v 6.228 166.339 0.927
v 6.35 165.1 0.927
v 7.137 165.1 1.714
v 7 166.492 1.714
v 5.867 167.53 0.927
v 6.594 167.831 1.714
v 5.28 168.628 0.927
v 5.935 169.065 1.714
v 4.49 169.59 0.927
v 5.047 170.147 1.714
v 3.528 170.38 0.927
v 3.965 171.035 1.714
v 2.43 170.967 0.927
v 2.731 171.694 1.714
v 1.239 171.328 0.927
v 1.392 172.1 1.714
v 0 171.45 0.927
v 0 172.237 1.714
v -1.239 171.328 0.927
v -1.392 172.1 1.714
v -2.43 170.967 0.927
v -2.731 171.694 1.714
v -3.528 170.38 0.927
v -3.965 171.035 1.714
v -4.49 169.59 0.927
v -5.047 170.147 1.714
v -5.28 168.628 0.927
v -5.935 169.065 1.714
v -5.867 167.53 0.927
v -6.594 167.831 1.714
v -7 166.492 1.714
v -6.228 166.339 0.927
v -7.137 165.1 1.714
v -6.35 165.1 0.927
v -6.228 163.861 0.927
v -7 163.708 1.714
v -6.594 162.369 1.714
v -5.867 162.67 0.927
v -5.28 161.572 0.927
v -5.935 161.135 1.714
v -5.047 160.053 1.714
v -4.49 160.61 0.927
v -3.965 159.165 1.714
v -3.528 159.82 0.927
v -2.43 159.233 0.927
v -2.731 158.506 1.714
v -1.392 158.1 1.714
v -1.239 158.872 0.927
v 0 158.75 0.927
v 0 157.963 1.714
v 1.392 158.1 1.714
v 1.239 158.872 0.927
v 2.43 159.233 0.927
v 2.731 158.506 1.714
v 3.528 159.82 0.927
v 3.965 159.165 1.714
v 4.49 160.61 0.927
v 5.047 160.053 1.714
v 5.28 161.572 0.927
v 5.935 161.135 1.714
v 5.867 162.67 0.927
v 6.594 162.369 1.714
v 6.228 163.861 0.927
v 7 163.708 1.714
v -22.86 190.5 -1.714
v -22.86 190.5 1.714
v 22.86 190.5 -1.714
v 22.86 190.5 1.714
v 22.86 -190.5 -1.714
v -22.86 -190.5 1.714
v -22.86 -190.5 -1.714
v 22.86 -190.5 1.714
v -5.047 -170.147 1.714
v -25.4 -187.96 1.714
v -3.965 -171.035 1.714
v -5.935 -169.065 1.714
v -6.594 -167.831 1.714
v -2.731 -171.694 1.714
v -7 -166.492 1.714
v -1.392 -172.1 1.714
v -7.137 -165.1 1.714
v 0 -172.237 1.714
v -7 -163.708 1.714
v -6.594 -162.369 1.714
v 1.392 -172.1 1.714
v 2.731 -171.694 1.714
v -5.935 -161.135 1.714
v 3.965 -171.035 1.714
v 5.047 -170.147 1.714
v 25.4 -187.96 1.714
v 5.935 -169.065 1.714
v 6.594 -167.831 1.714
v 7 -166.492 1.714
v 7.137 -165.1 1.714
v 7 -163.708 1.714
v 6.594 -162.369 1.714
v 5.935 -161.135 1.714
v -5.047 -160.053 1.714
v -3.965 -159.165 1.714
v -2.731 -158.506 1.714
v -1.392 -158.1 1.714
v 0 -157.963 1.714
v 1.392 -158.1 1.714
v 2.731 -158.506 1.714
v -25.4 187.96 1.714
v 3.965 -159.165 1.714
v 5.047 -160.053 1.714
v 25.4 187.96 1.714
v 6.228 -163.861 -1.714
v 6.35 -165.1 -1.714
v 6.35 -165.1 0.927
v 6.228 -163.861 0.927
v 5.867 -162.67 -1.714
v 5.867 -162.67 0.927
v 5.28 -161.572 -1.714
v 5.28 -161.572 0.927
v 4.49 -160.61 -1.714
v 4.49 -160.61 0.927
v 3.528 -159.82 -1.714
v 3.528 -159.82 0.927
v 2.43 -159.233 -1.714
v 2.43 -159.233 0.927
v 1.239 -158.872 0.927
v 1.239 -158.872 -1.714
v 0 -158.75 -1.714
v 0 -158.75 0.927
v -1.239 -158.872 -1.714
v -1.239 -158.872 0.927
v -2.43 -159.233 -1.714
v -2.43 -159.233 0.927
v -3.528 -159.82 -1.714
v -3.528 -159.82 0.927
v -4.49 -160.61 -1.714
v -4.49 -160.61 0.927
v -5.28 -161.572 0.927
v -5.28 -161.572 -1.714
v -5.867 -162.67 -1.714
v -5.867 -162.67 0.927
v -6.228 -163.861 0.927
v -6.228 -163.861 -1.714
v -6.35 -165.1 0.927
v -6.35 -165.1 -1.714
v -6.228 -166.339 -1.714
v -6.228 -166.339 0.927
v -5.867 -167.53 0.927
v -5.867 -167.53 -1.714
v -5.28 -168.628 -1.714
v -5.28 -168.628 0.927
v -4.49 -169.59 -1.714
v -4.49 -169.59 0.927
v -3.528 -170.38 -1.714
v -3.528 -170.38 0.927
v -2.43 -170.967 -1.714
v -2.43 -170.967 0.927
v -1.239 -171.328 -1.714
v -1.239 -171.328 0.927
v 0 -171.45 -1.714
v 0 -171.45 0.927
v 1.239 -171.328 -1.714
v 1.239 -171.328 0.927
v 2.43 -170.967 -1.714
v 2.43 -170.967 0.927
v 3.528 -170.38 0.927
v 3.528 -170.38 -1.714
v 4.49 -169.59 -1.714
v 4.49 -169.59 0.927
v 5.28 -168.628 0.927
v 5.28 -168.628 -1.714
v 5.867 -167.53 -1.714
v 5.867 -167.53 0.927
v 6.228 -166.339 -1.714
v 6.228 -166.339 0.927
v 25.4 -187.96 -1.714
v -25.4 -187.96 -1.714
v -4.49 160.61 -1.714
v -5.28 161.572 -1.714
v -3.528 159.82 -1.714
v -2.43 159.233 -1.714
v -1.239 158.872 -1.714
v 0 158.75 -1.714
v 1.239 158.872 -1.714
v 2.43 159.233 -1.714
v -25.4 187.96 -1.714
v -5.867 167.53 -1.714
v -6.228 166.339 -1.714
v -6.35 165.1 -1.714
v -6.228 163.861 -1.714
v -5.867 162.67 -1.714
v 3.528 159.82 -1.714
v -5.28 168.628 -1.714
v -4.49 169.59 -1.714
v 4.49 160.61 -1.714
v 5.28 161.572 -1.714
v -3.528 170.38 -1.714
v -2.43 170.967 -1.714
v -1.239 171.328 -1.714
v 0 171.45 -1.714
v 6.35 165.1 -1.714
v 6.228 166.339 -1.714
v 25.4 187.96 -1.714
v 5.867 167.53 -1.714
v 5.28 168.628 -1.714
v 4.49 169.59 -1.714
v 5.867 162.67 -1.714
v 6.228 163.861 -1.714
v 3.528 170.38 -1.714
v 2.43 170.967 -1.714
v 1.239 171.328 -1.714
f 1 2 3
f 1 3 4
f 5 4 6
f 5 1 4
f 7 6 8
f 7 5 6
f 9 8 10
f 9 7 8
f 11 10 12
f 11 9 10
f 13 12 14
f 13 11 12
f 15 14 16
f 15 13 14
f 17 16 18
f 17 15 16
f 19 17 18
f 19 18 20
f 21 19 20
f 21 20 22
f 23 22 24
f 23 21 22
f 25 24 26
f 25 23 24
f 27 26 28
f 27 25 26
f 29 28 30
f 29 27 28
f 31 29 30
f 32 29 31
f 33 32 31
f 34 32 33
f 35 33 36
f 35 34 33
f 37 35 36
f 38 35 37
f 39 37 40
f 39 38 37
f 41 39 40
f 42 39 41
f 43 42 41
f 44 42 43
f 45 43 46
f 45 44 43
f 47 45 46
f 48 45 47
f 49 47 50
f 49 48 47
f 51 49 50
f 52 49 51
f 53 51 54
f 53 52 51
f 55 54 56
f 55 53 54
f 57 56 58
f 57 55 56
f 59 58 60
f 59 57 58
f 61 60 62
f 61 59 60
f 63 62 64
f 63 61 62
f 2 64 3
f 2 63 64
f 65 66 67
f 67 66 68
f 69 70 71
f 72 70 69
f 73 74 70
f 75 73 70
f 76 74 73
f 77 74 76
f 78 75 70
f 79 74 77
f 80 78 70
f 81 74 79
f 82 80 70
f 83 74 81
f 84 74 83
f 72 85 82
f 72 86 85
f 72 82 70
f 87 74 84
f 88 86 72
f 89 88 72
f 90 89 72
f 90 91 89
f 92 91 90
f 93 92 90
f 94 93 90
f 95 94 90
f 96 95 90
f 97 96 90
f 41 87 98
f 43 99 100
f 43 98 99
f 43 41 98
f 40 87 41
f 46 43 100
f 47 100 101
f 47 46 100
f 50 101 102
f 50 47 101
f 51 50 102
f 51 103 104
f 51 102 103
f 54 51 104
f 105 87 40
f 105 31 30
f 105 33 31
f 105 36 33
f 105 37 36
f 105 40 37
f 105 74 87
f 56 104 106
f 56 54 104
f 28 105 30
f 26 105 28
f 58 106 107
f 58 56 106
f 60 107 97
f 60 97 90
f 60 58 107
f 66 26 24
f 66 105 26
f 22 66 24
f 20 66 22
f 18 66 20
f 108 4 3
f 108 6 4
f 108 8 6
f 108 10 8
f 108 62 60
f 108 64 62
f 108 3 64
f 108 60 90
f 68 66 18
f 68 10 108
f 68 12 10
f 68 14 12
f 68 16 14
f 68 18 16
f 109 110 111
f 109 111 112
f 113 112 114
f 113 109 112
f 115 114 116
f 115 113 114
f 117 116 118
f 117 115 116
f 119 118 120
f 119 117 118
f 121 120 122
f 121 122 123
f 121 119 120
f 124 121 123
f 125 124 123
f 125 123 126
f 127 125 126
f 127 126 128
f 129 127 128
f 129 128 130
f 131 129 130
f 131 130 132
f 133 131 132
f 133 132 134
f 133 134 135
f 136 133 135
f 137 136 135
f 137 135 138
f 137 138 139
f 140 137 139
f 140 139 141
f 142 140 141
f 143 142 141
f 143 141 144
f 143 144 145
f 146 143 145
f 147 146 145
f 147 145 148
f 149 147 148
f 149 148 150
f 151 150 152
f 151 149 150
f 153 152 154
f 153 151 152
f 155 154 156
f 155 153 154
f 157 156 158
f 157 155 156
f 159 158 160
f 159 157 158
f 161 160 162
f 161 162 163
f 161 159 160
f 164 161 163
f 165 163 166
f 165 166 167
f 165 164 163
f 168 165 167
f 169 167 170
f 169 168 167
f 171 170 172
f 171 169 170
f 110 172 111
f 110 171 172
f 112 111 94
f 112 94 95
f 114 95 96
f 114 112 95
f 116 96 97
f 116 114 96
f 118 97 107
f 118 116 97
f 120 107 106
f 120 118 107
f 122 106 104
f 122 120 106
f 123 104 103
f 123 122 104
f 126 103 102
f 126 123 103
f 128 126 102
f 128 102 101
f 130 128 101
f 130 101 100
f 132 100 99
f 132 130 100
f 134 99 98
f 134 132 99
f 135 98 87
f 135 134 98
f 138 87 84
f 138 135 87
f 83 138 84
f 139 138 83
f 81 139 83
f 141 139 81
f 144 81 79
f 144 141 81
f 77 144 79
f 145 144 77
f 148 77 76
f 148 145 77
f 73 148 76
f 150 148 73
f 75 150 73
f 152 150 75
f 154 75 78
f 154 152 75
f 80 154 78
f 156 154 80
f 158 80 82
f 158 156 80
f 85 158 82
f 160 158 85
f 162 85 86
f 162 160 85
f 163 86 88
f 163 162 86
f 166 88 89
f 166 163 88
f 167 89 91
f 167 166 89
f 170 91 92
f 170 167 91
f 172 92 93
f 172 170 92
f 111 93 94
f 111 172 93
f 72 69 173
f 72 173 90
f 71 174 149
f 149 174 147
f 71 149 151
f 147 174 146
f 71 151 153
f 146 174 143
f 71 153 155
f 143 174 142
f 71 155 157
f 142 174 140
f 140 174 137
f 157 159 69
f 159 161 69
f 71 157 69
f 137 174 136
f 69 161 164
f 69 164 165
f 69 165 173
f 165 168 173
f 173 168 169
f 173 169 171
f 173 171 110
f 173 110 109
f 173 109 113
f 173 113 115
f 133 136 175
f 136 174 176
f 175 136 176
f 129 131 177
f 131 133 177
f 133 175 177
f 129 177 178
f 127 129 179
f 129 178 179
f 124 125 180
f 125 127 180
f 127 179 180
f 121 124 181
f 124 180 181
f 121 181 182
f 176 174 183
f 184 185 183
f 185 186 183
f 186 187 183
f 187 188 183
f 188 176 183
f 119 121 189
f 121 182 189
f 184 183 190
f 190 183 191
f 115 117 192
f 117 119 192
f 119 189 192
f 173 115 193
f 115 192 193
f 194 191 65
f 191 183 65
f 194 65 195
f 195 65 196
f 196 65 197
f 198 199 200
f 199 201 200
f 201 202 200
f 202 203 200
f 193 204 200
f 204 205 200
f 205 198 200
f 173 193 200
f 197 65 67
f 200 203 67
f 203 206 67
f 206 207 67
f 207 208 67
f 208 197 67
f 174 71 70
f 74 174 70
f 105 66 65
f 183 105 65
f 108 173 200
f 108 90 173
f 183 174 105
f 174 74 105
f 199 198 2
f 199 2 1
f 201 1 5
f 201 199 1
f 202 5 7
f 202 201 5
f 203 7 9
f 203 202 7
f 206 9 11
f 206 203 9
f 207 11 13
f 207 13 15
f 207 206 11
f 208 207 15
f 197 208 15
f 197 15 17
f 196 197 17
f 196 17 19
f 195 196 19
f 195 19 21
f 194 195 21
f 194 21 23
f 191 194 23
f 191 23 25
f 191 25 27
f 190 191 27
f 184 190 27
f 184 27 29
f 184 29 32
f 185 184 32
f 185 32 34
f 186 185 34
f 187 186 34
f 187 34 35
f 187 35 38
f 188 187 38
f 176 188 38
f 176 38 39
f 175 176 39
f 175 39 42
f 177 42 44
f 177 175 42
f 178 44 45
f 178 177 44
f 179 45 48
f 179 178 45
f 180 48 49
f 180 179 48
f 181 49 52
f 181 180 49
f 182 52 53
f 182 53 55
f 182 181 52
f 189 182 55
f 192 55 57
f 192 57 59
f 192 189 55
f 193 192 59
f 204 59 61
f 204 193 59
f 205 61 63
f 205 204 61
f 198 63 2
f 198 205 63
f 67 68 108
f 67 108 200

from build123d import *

# Parameters (mm, degrees)
F0_W     = 50.8
F0_H     = 381
F0_R     = 6.35
F1_DEPTH = 1.7145
F2_SIZE  = 2.54
F3_SIZE  = 0.7874


with BuildPart() as f1:
    # F0 (on Top) → F1 (new body, symmetric)
    with BuildSketch(Plane.XY):
        Rectangle(F0_W, F0_H)
        with Locations((0, -165.1)):
            Circle(F0_R, mode=Mode.SUBTRACT)
        with Locations((0, 165.1)):
            Circle(F0_R, mode=Mode.SUBTRACT)
    extrude(amount=F1_DEPTH, both=True)

    # F2
    f2_edges = [f1.edges().sort_by_distance(p)[0] for p in [
        (25.4, -190.5, 0),
        (-25.4, -190.5, 0),
        (-25.4, 190.5, 0),
        (25.4, 190.5, 0),
    ]]
    chamfer(f2_edges, length=F2_SIZE)

    # F3
    f3_edges = [f1.edges().sort_by_distance(p)[0] for p in [
        (-6.35, -165.1, 1.7145),
        (-6.35, 165.1, 1.7145),
    ]]
    chamfer(f3_edges, length=F3_SIZE)


solid = f1.part
